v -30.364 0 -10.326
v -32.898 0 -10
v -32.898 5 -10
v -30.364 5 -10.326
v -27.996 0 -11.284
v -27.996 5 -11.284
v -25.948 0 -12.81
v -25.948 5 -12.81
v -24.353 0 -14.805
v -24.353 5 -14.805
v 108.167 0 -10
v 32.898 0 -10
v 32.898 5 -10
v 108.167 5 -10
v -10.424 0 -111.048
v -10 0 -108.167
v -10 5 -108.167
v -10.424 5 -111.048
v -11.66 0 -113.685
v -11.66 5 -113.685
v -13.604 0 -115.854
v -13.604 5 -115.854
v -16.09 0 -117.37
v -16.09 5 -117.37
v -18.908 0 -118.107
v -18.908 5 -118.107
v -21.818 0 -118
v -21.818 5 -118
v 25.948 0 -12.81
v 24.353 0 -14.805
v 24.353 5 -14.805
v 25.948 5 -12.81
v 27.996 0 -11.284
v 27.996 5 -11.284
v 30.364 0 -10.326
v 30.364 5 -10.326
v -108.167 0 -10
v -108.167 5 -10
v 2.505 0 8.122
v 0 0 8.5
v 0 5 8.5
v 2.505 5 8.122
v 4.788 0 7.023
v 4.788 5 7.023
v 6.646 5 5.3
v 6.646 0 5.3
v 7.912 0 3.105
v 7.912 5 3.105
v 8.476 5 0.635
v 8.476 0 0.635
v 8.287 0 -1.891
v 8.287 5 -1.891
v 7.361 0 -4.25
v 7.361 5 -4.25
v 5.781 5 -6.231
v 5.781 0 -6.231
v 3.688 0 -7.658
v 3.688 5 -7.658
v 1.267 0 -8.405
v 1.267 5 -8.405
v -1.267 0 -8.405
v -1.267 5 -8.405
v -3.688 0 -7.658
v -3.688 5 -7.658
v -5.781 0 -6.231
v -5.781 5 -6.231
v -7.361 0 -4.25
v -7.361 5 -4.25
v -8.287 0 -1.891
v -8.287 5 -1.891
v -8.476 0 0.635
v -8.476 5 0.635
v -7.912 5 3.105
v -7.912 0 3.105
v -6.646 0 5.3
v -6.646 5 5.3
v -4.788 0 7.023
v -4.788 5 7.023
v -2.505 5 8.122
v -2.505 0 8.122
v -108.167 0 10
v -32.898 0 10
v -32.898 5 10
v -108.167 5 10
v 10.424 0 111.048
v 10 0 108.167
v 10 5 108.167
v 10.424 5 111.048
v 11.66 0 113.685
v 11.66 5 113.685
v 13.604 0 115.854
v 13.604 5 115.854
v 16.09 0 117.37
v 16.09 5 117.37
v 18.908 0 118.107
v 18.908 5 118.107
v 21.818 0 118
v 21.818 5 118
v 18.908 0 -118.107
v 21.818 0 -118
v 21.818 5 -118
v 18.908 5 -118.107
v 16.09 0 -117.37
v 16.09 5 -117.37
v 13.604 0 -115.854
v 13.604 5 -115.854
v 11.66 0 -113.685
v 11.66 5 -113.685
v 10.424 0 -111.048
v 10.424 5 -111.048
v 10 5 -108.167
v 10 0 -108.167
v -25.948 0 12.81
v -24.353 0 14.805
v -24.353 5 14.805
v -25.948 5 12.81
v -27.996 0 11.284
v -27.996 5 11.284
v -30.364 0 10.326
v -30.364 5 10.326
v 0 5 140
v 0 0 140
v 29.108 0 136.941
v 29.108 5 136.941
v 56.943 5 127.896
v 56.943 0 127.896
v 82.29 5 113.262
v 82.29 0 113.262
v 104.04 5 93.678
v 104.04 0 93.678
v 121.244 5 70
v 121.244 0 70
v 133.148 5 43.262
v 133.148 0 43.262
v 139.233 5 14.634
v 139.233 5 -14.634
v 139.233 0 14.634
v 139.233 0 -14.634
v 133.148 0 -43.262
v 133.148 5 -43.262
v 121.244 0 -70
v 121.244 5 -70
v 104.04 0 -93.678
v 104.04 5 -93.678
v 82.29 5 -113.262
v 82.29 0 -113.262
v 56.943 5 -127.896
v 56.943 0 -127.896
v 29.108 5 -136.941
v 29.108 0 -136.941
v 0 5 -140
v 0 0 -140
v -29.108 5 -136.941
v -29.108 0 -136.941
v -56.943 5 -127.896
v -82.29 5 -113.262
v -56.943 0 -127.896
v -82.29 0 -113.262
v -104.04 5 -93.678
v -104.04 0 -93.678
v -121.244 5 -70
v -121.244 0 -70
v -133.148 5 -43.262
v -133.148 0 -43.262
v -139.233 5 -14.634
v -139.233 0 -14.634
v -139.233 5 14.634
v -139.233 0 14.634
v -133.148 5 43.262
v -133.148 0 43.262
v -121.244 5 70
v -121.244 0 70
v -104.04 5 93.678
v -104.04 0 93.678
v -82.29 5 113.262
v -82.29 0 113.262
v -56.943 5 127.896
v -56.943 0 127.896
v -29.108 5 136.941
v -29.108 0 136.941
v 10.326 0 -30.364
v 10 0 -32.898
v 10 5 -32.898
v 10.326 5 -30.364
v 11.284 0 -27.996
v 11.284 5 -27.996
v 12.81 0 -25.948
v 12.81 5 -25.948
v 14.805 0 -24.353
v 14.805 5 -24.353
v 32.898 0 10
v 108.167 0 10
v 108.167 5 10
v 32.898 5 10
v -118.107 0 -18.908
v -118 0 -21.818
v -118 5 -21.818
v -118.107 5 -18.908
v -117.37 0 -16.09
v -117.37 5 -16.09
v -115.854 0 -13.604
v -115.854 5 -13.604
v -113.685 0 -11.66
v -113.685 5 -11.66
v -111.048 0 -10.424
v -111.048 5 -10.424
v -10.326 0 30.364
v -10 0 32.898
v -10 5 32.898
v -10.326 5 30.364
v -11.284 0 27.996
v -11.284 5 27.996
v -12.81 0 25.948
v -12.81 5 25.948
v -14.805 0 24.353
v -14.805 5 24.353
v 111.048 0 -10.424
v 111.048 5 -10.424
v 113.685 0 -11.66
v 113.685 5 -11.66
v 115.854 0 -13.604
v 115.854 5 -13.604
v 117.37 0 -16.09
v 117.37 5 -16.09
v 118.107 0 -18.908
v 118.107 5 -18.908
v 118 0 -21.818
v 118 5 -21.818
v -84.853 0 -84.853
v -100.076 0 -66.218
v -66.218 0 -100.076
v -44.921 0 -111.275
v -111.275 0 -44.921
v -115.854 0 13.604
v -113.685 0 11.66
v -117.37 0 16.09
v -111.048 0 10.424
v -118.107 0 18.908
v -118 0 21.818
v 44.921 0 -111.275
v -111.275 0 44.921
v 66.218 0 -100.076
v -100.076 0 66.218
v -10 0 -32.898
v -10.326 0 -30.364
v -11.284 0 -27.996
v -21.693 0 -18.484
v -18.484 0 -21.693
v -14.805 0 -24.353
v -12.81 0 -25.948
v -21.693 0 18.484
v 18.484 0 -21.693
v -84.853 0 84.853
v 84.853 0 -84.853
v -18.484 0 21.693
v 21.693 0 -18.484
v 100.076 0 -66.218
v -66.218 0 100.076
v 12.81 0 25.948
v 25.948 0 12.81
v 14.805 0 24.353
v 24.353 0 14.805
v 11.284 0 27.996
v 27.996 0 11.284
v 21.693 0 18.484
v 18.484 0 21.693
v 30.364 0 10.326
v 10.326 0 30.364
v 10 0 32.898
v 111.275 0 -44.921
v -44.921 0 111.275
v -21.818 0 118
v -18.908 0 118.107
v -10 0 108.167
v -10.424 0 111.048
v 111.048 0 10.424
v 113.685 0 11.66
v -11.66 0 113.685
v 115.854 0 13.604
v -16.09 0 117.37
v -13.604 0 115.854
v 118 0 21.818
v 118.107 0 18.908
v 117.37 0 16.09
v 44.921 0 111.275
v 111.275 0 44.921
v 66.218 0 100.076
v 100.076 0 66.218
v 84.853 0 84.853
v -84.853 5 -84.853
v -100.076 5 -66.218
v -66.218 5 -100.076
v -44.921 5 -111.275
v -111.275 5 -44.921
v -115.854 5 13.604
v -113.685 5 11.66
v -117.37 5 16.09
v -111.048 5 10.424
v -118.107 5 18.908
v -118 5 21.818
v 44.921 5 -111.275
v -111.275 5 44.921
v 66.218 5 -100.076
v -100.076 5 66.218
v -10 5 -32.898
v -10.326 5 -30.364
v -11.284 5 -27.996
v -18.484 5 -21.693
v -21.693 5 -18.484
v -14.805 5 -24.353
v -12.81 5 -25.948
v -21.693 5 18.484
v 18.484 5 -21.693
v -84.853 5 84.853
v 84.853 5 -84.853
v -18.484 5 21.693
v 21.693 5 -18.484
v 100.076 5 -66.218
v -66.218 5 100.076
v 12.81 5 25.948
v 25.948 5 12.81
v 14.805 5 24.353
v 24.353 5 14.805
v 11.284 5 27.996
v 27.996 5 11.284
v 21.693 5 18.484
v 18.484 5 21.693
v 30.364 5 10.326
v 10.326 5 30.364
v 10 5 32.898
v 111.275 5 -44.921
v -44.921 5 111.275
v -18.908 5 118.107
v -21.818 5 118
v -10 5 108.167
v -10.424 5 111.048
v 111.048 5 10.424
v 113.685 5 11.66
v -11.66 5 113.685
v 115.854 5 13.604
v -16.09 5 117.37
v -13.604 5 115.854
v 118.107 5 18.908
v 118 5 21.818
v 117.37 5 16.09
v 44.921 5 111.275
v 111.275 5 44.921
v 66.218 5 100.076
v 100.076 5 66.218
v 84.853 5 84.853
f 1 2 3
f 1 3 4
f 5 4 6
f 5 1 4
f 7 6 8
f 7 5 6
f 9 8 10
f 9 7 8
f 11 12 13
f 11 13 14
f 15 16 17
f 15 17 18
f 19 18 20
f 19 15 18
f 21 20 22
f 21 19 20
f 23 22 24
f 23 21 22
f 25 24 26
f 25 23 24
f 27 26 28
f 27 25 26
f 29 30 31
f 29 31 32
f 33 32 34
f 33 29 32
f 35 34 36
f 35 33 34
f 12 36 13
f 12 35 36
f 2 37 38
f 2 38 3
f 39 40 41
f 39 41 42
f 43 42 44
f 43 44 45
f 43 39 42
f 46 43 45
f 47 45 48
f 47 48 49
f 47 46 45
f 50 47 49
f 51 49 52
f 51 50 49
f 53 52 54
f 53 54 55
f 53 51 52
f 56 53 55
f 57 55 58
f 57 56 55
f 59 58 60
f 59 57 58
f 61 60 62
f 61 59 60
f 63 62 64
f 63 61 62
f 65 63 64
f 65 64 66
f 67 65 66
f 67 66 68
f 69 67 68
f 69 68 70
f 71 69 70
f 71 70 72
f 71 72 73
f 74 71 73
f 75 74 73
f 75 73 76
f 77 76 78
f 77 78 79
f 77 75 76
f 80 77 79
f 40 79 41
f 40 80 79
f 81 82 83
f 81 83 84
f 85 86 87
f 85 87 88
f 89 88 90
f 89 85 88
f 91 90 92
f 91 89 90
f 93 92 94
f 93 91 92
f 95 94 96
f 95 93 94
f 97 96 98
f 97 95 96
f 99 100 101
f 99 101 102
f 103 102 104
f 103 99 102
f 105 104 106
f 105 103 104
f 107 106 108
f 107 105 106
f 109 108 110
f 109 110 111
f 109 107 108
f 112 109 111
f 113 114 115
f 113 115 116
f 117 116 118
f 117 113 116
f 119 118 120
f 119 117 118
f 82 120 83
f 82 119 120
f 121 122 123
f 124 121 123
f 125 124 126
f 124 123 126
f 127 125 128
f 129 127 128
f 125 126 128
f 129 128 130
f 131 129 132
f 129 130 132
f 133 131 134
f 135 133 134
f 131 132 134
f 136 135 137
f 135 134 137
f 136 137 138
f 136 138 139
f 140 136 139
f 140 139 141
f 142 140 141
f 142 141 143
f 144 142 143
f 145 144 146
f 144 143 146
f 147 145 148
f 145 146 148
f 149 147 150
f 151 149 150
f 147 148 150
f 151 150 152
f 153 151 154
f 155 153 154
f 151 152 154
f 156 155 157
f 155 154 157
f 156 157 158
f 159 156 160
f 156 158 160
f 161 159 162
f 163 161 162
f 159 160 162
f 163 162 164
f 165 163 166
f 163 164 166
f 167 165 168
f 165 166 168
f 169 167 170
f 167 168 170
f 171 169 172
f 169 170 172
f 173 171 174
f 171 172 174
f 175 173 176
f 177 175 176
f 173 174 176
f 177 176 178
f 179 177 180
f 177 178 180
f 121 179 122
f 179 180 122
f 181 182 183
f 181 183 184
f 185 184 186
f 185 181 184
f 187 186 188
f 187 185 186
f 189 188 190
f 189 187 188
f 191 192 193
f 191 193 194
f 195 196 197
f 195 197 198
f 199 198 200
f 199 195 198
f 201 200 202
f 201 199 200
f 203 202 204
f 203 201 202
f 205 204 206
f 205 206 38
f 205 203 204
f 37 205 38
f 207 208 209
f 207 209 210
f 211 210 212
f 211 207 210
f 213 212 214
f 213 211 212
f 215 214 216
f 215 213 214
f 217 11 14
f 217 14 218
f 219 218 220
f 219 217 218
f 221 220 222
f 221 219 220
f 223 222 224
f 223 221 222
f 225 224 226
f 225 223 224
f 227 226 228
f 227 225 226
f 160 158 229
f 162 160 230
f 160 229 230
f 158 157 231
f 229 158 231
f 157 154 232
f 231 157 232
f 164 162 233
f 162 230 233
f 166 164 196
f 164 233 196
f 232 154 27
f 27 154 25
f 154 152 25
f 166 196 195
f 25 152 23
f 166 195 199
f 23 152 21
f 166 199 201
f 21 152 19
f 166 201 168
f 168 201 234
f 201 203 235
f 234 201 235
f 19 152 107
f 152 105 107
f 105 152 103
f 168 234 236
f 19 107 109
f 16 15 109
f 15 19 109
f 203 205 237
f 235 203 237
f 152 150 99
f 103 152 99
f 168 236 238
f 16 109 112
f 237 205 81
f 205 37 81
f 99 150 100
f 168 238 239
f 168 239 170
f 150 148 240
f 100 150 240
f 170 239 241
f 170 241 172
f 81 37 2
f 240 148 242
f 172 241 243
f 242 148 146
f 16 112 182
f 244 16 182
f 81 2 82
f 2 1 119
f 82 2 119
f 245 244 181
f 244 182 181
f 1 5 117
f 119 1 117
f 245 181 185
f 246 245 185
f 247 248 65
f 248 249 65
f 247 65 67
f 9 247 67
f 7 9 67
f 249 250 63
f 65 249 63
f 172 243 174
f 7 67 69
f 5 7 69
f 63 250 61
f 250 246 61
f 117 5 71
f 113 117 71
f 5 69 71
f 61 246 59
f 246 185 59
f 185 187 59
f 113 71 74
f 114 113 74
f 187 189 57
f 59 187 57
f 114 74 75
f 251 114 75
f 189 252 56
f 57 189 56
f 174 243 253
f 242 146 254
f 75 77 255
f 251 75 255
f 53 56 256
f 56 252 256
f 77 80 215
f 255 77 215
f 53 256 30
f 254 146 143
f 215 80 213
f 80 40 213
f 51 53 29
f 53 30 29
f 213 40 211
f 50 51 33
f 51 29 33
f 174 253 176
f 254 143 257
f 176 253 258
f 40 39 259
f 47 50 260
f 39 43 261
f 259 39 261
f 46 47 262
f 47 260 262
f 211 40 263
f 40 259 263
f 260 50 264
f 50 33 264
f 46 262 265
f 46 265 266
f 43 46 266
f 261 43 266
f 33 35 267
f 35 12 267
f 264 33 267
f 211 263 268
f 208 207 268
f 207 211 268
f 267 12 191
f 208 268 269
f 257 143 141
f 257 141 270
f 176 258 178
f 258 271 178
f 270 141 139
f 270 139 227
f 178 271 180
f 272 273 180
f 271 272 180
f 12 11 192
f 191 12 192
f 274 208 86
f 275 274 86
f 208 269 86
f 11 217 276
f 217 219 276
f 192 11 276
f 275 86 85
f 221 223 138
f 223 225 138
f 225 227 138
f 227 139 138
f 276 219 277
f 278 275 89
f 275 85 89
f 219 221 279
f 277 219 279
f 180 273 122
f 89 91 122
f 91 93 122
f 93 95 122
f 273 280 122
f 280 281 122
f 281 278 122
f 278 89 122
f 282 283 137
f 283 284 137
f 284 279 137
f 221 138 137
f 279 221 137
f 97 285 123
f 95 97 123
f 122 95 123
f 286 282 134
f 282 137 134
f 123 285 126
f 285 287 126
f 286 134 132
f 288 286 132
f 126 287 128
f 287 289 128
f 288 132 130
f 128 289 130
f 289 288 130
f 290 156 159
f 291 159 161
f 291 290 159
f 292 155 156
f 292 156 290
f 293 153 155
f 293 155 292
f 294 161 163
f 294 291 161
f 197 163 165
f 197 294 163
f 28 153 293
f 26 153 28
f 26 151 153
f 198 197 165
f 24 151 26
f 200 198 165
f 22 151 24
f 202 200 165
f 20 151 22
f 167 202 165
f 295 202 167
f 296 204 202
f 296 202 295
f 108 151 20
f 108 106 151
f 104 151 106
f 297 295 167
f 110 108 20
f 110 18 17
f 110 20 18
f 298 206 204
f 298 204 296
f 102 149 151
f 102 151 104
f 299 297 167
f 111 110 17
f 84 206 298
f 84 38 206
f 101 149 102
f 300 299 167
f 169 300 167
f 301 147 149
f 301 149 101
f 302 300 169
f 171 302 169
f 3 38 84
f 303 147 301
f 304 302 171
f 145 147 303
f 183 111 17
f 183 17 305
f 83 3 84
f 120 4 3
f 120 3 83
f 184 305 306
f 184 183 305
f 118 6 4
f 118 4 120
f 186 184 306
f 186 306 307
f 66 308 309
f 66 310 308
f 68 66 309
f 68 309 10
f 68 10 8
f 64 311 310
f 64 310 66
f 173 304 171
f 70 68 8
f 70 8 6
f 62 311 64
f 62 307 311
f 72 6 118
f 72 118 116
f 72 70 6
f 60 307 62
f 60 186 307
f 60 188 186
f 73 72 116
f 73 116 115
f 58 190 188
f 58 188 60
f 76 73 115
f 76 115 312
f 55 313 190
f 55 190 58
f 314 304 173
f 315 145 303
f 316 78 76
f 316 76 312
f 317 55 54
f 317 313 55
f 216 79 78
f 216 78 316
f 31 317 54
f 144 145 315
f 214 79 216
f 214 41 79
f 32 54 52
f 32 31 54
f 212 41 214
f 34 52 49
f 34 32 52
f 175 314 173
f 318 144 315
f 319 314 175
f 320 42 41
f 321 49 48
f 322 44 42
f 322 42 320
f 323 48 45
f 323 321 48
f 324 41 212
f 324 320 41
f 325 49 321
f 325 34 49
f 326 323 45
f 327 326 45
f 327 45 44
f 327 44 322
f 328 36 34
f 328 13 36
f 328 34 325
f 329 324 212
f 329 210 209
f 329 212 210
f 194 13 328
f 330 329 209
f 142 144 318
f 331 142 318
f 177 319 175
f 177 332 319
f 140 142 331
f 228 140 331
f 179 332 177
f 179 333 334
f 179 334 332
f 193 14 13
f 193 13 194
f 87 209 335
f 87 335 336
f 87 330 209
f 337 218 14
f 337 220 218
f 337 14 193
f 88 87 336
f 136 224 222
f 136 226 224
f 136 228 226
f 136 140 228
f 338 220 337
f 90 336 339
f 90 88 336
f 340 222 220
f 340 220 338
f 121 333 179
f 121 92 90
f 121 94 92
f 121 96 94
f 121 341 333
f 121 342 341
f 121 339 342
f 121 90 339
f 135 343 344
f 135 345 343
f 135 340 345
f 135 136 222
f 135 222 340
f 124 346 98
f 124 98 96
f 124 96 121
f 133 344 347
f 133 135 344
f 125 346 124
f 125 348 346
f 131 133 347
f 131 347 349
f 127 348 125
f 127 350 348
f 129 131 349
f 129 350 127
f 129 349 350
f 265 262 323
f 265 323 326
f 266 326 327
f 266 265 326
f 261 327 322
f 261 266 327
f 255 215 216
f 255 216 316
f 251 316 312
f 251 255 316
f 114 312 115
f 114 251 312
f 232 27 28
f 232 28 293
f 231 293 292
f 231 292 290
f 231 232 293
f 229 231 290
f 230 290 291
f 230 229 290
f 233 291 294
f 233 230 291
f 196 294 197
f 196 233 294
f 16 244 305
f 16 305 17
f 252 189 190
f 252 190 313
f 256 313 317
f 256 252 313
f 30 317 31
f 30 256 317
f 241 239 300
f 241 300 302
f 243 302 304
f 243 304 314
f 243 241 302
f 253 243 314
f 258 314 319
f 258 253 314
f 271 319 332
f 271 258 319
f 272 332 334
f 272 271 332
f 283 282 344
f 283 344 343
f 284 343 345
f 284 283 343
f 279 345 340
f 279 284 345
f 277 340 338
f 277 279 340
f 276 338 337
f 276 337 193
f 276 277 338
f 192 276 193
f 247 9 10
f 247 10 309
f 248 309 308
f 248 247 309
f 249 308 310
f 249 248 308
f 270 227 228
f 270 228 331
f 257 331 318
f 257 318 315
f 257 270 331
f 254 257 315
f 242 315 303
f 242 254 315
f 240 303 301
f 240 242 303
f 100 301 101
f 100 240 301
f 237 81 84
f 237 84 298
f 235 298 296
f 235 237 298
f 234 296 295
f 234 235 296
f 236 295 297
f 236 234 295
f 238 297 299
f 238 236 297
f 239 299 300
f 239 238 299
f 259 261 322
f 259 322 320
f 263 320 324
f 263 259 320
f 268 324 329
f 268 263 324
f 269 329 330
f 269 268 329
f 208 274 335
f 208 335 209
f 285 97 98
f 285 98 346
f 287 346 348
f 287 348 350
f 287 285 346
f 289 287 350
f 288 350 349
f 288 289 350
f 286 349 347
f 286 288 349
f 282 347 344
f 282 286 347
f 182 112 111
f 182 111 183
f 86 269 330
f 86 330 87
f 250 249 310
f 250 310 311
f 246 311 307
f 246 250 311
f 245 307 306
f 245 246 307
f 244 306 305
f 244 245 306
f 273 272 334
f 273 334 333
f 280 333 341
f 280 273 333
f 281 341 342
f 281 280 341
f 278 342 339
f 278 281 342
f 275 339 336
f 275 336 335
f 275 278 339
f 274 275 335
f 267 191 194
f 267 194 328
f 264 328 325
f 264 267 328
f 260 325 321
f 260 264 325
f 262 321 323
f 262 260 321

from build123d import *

# Parameters (mm, degrees)
SKETCH_1_R      = 140
SKETCH_1_R_2    = 8.5
EXTRUDE_1_DEPTH = 5


with BuildPart() as part:
    # ｽｹｯﾁ1 → ﾎﾞｽ - 押し出し1 (new body)
    with BuildSketch(Plane(origin=(0, 0, 0), x_dir=(1, 0, 0), z_dir=(0, 1, 0))):
        with Locations(Location((0, 0, 0), (0, 0, 270))):
            Circle(SKETCH_1_R)
        with Locations(Location((0, 0, 0), (0, 0, 270))):
            Circle(SKETCH_1_R_2, mode=Mode.SUBTRACT)
        with BuildLine():
            Line((-108.166538264, 10), (-32.897568299, 10))
            ThreePointArc((-32.897568299, 10), (-27.995938568, 11.283691953), (-24.352745364, 14.805194805))
            ThreePointArc((-24.352745364, 14.805194805), (-20.152543264, 20.152543264), (-14.805194805, 24.352745364))
            ThreePointArc((-14.805194805, 24.352745364), (-11.283691953, 27.995938568), (-10, 32.897568299))
            Line((-10, 32.897568299), (-10, 108.166538264))
            ThreePointArc((-10, 108.166538264), (-13.603978509, 115.853599412), (-21.818181818, 117.999859924))
            ThreePointArc((-21.818181818, 117.999859924), (-84.852813742, 84.852813742), (-117.999859924, 21.818181818))
            ThreePointArc((-117.999859924, 21.818181818), (-115.853599412, 13.603978509), (-108.166538264, 10))
        make_face(mode=Mode.SUBTRACT)
        with BuildLine():
            Line((10, 108.166538264), (10, 32.897568299))
            ThreePointArc((10, 32.897568299), (11.283691953, 27.995938568), (14.805194805, 24.352745364))
            ThreePointArc((14.805194805, 24.352745364), (20.152543264, 20.152543264), (24.352745364, 14.805194805))
            ThreePointArc((24.352745364, 14.805194805), (27.995938568, 11.283691953), (32.897568299, 10))
            Line((32.897568299, 10), (108.166538264, 10))
            ThreePointArc((108.166538264, 10), (115.853599412, 13.603978509), (117.999859924, 21.818181818))
            ThreePointArc((117.999859924, 21.818181818), (84.852813742, 84.852813742), (21.818181818, 117.999859924))
            ThreePointArc((21.818181818, 117.999859924), (13.603978509, 115.853599412), (10, 108.166538264))
        make_face(mode=Mode.SUBTRACT)
        with BuildLine():
            Line((108.166538264, -10), (32.897568299, -10))
            ThreePointArc((32.897568299, -10), (27.995938568, -11.283691953), (24.352745364, -14.805194805))
            ThreePointArc((24.352745364, -14.805194805), (20.152543264, -20.152543264), (14.805194805, -24.352745364))
            ThreePointArc((14.805194805, -24.352745364), (11.283691953, -27.995938568), (10, -32.897568299))
            Line((10, -32.897568299), (10, -108.166538264))
            ThreePointArc((10, -108.166538264), (13.603978509, -115.853599412), (21.818181818, -117.999859924))
            ThreePointArc((21.818181818, -117.999859924), (84.852813742, -84.852813742), (117.999859924, -21.818181818))
            ThreePointArc((117.999859924, -21.818181818), (115.853599412, -13.603978509), (108.166538264, -10))
        make_face(mode=Mode.SUBTRACT)
        with BuildLine():
            Line((-10, -108.166538264), (-10, -32.897568299))
            ThreePointArc((-10, -32.897568299), (-11.283691953, -27.995938568), (-14.805194805, -24.352745364))
            ThreePointArc((-14.805194805, -24.352745364), (-20.152543264, -20.152543264), (-24.352745364, -14.805194805))
            ThreePointArc((-24.352745364, -14.805194805), (-27.995938568, -11.283691953), (-32.897568299, -10))
            Line((-32.897568299, -10), (-108.166538264, -10))
            ThreePointArc((-108.166538264, -10), (-115.853599412, -13.603978509), (-117.999859924, -21.818181818))
            ThreePointArc((-117.999859924, -21.818181818), (-84.852813742, -84.852813742), (-21.818181818, -117.999859924))
            ThreePointArc((-21.818181818, -117.999859924), (-13.603978509, -115.853599412), (-10, -108.166538264))
        make_face(mode=Mode.SUBTRACT)
    extrude(amount=EXTRUDE_1_DEPTH)


solid = part.part
